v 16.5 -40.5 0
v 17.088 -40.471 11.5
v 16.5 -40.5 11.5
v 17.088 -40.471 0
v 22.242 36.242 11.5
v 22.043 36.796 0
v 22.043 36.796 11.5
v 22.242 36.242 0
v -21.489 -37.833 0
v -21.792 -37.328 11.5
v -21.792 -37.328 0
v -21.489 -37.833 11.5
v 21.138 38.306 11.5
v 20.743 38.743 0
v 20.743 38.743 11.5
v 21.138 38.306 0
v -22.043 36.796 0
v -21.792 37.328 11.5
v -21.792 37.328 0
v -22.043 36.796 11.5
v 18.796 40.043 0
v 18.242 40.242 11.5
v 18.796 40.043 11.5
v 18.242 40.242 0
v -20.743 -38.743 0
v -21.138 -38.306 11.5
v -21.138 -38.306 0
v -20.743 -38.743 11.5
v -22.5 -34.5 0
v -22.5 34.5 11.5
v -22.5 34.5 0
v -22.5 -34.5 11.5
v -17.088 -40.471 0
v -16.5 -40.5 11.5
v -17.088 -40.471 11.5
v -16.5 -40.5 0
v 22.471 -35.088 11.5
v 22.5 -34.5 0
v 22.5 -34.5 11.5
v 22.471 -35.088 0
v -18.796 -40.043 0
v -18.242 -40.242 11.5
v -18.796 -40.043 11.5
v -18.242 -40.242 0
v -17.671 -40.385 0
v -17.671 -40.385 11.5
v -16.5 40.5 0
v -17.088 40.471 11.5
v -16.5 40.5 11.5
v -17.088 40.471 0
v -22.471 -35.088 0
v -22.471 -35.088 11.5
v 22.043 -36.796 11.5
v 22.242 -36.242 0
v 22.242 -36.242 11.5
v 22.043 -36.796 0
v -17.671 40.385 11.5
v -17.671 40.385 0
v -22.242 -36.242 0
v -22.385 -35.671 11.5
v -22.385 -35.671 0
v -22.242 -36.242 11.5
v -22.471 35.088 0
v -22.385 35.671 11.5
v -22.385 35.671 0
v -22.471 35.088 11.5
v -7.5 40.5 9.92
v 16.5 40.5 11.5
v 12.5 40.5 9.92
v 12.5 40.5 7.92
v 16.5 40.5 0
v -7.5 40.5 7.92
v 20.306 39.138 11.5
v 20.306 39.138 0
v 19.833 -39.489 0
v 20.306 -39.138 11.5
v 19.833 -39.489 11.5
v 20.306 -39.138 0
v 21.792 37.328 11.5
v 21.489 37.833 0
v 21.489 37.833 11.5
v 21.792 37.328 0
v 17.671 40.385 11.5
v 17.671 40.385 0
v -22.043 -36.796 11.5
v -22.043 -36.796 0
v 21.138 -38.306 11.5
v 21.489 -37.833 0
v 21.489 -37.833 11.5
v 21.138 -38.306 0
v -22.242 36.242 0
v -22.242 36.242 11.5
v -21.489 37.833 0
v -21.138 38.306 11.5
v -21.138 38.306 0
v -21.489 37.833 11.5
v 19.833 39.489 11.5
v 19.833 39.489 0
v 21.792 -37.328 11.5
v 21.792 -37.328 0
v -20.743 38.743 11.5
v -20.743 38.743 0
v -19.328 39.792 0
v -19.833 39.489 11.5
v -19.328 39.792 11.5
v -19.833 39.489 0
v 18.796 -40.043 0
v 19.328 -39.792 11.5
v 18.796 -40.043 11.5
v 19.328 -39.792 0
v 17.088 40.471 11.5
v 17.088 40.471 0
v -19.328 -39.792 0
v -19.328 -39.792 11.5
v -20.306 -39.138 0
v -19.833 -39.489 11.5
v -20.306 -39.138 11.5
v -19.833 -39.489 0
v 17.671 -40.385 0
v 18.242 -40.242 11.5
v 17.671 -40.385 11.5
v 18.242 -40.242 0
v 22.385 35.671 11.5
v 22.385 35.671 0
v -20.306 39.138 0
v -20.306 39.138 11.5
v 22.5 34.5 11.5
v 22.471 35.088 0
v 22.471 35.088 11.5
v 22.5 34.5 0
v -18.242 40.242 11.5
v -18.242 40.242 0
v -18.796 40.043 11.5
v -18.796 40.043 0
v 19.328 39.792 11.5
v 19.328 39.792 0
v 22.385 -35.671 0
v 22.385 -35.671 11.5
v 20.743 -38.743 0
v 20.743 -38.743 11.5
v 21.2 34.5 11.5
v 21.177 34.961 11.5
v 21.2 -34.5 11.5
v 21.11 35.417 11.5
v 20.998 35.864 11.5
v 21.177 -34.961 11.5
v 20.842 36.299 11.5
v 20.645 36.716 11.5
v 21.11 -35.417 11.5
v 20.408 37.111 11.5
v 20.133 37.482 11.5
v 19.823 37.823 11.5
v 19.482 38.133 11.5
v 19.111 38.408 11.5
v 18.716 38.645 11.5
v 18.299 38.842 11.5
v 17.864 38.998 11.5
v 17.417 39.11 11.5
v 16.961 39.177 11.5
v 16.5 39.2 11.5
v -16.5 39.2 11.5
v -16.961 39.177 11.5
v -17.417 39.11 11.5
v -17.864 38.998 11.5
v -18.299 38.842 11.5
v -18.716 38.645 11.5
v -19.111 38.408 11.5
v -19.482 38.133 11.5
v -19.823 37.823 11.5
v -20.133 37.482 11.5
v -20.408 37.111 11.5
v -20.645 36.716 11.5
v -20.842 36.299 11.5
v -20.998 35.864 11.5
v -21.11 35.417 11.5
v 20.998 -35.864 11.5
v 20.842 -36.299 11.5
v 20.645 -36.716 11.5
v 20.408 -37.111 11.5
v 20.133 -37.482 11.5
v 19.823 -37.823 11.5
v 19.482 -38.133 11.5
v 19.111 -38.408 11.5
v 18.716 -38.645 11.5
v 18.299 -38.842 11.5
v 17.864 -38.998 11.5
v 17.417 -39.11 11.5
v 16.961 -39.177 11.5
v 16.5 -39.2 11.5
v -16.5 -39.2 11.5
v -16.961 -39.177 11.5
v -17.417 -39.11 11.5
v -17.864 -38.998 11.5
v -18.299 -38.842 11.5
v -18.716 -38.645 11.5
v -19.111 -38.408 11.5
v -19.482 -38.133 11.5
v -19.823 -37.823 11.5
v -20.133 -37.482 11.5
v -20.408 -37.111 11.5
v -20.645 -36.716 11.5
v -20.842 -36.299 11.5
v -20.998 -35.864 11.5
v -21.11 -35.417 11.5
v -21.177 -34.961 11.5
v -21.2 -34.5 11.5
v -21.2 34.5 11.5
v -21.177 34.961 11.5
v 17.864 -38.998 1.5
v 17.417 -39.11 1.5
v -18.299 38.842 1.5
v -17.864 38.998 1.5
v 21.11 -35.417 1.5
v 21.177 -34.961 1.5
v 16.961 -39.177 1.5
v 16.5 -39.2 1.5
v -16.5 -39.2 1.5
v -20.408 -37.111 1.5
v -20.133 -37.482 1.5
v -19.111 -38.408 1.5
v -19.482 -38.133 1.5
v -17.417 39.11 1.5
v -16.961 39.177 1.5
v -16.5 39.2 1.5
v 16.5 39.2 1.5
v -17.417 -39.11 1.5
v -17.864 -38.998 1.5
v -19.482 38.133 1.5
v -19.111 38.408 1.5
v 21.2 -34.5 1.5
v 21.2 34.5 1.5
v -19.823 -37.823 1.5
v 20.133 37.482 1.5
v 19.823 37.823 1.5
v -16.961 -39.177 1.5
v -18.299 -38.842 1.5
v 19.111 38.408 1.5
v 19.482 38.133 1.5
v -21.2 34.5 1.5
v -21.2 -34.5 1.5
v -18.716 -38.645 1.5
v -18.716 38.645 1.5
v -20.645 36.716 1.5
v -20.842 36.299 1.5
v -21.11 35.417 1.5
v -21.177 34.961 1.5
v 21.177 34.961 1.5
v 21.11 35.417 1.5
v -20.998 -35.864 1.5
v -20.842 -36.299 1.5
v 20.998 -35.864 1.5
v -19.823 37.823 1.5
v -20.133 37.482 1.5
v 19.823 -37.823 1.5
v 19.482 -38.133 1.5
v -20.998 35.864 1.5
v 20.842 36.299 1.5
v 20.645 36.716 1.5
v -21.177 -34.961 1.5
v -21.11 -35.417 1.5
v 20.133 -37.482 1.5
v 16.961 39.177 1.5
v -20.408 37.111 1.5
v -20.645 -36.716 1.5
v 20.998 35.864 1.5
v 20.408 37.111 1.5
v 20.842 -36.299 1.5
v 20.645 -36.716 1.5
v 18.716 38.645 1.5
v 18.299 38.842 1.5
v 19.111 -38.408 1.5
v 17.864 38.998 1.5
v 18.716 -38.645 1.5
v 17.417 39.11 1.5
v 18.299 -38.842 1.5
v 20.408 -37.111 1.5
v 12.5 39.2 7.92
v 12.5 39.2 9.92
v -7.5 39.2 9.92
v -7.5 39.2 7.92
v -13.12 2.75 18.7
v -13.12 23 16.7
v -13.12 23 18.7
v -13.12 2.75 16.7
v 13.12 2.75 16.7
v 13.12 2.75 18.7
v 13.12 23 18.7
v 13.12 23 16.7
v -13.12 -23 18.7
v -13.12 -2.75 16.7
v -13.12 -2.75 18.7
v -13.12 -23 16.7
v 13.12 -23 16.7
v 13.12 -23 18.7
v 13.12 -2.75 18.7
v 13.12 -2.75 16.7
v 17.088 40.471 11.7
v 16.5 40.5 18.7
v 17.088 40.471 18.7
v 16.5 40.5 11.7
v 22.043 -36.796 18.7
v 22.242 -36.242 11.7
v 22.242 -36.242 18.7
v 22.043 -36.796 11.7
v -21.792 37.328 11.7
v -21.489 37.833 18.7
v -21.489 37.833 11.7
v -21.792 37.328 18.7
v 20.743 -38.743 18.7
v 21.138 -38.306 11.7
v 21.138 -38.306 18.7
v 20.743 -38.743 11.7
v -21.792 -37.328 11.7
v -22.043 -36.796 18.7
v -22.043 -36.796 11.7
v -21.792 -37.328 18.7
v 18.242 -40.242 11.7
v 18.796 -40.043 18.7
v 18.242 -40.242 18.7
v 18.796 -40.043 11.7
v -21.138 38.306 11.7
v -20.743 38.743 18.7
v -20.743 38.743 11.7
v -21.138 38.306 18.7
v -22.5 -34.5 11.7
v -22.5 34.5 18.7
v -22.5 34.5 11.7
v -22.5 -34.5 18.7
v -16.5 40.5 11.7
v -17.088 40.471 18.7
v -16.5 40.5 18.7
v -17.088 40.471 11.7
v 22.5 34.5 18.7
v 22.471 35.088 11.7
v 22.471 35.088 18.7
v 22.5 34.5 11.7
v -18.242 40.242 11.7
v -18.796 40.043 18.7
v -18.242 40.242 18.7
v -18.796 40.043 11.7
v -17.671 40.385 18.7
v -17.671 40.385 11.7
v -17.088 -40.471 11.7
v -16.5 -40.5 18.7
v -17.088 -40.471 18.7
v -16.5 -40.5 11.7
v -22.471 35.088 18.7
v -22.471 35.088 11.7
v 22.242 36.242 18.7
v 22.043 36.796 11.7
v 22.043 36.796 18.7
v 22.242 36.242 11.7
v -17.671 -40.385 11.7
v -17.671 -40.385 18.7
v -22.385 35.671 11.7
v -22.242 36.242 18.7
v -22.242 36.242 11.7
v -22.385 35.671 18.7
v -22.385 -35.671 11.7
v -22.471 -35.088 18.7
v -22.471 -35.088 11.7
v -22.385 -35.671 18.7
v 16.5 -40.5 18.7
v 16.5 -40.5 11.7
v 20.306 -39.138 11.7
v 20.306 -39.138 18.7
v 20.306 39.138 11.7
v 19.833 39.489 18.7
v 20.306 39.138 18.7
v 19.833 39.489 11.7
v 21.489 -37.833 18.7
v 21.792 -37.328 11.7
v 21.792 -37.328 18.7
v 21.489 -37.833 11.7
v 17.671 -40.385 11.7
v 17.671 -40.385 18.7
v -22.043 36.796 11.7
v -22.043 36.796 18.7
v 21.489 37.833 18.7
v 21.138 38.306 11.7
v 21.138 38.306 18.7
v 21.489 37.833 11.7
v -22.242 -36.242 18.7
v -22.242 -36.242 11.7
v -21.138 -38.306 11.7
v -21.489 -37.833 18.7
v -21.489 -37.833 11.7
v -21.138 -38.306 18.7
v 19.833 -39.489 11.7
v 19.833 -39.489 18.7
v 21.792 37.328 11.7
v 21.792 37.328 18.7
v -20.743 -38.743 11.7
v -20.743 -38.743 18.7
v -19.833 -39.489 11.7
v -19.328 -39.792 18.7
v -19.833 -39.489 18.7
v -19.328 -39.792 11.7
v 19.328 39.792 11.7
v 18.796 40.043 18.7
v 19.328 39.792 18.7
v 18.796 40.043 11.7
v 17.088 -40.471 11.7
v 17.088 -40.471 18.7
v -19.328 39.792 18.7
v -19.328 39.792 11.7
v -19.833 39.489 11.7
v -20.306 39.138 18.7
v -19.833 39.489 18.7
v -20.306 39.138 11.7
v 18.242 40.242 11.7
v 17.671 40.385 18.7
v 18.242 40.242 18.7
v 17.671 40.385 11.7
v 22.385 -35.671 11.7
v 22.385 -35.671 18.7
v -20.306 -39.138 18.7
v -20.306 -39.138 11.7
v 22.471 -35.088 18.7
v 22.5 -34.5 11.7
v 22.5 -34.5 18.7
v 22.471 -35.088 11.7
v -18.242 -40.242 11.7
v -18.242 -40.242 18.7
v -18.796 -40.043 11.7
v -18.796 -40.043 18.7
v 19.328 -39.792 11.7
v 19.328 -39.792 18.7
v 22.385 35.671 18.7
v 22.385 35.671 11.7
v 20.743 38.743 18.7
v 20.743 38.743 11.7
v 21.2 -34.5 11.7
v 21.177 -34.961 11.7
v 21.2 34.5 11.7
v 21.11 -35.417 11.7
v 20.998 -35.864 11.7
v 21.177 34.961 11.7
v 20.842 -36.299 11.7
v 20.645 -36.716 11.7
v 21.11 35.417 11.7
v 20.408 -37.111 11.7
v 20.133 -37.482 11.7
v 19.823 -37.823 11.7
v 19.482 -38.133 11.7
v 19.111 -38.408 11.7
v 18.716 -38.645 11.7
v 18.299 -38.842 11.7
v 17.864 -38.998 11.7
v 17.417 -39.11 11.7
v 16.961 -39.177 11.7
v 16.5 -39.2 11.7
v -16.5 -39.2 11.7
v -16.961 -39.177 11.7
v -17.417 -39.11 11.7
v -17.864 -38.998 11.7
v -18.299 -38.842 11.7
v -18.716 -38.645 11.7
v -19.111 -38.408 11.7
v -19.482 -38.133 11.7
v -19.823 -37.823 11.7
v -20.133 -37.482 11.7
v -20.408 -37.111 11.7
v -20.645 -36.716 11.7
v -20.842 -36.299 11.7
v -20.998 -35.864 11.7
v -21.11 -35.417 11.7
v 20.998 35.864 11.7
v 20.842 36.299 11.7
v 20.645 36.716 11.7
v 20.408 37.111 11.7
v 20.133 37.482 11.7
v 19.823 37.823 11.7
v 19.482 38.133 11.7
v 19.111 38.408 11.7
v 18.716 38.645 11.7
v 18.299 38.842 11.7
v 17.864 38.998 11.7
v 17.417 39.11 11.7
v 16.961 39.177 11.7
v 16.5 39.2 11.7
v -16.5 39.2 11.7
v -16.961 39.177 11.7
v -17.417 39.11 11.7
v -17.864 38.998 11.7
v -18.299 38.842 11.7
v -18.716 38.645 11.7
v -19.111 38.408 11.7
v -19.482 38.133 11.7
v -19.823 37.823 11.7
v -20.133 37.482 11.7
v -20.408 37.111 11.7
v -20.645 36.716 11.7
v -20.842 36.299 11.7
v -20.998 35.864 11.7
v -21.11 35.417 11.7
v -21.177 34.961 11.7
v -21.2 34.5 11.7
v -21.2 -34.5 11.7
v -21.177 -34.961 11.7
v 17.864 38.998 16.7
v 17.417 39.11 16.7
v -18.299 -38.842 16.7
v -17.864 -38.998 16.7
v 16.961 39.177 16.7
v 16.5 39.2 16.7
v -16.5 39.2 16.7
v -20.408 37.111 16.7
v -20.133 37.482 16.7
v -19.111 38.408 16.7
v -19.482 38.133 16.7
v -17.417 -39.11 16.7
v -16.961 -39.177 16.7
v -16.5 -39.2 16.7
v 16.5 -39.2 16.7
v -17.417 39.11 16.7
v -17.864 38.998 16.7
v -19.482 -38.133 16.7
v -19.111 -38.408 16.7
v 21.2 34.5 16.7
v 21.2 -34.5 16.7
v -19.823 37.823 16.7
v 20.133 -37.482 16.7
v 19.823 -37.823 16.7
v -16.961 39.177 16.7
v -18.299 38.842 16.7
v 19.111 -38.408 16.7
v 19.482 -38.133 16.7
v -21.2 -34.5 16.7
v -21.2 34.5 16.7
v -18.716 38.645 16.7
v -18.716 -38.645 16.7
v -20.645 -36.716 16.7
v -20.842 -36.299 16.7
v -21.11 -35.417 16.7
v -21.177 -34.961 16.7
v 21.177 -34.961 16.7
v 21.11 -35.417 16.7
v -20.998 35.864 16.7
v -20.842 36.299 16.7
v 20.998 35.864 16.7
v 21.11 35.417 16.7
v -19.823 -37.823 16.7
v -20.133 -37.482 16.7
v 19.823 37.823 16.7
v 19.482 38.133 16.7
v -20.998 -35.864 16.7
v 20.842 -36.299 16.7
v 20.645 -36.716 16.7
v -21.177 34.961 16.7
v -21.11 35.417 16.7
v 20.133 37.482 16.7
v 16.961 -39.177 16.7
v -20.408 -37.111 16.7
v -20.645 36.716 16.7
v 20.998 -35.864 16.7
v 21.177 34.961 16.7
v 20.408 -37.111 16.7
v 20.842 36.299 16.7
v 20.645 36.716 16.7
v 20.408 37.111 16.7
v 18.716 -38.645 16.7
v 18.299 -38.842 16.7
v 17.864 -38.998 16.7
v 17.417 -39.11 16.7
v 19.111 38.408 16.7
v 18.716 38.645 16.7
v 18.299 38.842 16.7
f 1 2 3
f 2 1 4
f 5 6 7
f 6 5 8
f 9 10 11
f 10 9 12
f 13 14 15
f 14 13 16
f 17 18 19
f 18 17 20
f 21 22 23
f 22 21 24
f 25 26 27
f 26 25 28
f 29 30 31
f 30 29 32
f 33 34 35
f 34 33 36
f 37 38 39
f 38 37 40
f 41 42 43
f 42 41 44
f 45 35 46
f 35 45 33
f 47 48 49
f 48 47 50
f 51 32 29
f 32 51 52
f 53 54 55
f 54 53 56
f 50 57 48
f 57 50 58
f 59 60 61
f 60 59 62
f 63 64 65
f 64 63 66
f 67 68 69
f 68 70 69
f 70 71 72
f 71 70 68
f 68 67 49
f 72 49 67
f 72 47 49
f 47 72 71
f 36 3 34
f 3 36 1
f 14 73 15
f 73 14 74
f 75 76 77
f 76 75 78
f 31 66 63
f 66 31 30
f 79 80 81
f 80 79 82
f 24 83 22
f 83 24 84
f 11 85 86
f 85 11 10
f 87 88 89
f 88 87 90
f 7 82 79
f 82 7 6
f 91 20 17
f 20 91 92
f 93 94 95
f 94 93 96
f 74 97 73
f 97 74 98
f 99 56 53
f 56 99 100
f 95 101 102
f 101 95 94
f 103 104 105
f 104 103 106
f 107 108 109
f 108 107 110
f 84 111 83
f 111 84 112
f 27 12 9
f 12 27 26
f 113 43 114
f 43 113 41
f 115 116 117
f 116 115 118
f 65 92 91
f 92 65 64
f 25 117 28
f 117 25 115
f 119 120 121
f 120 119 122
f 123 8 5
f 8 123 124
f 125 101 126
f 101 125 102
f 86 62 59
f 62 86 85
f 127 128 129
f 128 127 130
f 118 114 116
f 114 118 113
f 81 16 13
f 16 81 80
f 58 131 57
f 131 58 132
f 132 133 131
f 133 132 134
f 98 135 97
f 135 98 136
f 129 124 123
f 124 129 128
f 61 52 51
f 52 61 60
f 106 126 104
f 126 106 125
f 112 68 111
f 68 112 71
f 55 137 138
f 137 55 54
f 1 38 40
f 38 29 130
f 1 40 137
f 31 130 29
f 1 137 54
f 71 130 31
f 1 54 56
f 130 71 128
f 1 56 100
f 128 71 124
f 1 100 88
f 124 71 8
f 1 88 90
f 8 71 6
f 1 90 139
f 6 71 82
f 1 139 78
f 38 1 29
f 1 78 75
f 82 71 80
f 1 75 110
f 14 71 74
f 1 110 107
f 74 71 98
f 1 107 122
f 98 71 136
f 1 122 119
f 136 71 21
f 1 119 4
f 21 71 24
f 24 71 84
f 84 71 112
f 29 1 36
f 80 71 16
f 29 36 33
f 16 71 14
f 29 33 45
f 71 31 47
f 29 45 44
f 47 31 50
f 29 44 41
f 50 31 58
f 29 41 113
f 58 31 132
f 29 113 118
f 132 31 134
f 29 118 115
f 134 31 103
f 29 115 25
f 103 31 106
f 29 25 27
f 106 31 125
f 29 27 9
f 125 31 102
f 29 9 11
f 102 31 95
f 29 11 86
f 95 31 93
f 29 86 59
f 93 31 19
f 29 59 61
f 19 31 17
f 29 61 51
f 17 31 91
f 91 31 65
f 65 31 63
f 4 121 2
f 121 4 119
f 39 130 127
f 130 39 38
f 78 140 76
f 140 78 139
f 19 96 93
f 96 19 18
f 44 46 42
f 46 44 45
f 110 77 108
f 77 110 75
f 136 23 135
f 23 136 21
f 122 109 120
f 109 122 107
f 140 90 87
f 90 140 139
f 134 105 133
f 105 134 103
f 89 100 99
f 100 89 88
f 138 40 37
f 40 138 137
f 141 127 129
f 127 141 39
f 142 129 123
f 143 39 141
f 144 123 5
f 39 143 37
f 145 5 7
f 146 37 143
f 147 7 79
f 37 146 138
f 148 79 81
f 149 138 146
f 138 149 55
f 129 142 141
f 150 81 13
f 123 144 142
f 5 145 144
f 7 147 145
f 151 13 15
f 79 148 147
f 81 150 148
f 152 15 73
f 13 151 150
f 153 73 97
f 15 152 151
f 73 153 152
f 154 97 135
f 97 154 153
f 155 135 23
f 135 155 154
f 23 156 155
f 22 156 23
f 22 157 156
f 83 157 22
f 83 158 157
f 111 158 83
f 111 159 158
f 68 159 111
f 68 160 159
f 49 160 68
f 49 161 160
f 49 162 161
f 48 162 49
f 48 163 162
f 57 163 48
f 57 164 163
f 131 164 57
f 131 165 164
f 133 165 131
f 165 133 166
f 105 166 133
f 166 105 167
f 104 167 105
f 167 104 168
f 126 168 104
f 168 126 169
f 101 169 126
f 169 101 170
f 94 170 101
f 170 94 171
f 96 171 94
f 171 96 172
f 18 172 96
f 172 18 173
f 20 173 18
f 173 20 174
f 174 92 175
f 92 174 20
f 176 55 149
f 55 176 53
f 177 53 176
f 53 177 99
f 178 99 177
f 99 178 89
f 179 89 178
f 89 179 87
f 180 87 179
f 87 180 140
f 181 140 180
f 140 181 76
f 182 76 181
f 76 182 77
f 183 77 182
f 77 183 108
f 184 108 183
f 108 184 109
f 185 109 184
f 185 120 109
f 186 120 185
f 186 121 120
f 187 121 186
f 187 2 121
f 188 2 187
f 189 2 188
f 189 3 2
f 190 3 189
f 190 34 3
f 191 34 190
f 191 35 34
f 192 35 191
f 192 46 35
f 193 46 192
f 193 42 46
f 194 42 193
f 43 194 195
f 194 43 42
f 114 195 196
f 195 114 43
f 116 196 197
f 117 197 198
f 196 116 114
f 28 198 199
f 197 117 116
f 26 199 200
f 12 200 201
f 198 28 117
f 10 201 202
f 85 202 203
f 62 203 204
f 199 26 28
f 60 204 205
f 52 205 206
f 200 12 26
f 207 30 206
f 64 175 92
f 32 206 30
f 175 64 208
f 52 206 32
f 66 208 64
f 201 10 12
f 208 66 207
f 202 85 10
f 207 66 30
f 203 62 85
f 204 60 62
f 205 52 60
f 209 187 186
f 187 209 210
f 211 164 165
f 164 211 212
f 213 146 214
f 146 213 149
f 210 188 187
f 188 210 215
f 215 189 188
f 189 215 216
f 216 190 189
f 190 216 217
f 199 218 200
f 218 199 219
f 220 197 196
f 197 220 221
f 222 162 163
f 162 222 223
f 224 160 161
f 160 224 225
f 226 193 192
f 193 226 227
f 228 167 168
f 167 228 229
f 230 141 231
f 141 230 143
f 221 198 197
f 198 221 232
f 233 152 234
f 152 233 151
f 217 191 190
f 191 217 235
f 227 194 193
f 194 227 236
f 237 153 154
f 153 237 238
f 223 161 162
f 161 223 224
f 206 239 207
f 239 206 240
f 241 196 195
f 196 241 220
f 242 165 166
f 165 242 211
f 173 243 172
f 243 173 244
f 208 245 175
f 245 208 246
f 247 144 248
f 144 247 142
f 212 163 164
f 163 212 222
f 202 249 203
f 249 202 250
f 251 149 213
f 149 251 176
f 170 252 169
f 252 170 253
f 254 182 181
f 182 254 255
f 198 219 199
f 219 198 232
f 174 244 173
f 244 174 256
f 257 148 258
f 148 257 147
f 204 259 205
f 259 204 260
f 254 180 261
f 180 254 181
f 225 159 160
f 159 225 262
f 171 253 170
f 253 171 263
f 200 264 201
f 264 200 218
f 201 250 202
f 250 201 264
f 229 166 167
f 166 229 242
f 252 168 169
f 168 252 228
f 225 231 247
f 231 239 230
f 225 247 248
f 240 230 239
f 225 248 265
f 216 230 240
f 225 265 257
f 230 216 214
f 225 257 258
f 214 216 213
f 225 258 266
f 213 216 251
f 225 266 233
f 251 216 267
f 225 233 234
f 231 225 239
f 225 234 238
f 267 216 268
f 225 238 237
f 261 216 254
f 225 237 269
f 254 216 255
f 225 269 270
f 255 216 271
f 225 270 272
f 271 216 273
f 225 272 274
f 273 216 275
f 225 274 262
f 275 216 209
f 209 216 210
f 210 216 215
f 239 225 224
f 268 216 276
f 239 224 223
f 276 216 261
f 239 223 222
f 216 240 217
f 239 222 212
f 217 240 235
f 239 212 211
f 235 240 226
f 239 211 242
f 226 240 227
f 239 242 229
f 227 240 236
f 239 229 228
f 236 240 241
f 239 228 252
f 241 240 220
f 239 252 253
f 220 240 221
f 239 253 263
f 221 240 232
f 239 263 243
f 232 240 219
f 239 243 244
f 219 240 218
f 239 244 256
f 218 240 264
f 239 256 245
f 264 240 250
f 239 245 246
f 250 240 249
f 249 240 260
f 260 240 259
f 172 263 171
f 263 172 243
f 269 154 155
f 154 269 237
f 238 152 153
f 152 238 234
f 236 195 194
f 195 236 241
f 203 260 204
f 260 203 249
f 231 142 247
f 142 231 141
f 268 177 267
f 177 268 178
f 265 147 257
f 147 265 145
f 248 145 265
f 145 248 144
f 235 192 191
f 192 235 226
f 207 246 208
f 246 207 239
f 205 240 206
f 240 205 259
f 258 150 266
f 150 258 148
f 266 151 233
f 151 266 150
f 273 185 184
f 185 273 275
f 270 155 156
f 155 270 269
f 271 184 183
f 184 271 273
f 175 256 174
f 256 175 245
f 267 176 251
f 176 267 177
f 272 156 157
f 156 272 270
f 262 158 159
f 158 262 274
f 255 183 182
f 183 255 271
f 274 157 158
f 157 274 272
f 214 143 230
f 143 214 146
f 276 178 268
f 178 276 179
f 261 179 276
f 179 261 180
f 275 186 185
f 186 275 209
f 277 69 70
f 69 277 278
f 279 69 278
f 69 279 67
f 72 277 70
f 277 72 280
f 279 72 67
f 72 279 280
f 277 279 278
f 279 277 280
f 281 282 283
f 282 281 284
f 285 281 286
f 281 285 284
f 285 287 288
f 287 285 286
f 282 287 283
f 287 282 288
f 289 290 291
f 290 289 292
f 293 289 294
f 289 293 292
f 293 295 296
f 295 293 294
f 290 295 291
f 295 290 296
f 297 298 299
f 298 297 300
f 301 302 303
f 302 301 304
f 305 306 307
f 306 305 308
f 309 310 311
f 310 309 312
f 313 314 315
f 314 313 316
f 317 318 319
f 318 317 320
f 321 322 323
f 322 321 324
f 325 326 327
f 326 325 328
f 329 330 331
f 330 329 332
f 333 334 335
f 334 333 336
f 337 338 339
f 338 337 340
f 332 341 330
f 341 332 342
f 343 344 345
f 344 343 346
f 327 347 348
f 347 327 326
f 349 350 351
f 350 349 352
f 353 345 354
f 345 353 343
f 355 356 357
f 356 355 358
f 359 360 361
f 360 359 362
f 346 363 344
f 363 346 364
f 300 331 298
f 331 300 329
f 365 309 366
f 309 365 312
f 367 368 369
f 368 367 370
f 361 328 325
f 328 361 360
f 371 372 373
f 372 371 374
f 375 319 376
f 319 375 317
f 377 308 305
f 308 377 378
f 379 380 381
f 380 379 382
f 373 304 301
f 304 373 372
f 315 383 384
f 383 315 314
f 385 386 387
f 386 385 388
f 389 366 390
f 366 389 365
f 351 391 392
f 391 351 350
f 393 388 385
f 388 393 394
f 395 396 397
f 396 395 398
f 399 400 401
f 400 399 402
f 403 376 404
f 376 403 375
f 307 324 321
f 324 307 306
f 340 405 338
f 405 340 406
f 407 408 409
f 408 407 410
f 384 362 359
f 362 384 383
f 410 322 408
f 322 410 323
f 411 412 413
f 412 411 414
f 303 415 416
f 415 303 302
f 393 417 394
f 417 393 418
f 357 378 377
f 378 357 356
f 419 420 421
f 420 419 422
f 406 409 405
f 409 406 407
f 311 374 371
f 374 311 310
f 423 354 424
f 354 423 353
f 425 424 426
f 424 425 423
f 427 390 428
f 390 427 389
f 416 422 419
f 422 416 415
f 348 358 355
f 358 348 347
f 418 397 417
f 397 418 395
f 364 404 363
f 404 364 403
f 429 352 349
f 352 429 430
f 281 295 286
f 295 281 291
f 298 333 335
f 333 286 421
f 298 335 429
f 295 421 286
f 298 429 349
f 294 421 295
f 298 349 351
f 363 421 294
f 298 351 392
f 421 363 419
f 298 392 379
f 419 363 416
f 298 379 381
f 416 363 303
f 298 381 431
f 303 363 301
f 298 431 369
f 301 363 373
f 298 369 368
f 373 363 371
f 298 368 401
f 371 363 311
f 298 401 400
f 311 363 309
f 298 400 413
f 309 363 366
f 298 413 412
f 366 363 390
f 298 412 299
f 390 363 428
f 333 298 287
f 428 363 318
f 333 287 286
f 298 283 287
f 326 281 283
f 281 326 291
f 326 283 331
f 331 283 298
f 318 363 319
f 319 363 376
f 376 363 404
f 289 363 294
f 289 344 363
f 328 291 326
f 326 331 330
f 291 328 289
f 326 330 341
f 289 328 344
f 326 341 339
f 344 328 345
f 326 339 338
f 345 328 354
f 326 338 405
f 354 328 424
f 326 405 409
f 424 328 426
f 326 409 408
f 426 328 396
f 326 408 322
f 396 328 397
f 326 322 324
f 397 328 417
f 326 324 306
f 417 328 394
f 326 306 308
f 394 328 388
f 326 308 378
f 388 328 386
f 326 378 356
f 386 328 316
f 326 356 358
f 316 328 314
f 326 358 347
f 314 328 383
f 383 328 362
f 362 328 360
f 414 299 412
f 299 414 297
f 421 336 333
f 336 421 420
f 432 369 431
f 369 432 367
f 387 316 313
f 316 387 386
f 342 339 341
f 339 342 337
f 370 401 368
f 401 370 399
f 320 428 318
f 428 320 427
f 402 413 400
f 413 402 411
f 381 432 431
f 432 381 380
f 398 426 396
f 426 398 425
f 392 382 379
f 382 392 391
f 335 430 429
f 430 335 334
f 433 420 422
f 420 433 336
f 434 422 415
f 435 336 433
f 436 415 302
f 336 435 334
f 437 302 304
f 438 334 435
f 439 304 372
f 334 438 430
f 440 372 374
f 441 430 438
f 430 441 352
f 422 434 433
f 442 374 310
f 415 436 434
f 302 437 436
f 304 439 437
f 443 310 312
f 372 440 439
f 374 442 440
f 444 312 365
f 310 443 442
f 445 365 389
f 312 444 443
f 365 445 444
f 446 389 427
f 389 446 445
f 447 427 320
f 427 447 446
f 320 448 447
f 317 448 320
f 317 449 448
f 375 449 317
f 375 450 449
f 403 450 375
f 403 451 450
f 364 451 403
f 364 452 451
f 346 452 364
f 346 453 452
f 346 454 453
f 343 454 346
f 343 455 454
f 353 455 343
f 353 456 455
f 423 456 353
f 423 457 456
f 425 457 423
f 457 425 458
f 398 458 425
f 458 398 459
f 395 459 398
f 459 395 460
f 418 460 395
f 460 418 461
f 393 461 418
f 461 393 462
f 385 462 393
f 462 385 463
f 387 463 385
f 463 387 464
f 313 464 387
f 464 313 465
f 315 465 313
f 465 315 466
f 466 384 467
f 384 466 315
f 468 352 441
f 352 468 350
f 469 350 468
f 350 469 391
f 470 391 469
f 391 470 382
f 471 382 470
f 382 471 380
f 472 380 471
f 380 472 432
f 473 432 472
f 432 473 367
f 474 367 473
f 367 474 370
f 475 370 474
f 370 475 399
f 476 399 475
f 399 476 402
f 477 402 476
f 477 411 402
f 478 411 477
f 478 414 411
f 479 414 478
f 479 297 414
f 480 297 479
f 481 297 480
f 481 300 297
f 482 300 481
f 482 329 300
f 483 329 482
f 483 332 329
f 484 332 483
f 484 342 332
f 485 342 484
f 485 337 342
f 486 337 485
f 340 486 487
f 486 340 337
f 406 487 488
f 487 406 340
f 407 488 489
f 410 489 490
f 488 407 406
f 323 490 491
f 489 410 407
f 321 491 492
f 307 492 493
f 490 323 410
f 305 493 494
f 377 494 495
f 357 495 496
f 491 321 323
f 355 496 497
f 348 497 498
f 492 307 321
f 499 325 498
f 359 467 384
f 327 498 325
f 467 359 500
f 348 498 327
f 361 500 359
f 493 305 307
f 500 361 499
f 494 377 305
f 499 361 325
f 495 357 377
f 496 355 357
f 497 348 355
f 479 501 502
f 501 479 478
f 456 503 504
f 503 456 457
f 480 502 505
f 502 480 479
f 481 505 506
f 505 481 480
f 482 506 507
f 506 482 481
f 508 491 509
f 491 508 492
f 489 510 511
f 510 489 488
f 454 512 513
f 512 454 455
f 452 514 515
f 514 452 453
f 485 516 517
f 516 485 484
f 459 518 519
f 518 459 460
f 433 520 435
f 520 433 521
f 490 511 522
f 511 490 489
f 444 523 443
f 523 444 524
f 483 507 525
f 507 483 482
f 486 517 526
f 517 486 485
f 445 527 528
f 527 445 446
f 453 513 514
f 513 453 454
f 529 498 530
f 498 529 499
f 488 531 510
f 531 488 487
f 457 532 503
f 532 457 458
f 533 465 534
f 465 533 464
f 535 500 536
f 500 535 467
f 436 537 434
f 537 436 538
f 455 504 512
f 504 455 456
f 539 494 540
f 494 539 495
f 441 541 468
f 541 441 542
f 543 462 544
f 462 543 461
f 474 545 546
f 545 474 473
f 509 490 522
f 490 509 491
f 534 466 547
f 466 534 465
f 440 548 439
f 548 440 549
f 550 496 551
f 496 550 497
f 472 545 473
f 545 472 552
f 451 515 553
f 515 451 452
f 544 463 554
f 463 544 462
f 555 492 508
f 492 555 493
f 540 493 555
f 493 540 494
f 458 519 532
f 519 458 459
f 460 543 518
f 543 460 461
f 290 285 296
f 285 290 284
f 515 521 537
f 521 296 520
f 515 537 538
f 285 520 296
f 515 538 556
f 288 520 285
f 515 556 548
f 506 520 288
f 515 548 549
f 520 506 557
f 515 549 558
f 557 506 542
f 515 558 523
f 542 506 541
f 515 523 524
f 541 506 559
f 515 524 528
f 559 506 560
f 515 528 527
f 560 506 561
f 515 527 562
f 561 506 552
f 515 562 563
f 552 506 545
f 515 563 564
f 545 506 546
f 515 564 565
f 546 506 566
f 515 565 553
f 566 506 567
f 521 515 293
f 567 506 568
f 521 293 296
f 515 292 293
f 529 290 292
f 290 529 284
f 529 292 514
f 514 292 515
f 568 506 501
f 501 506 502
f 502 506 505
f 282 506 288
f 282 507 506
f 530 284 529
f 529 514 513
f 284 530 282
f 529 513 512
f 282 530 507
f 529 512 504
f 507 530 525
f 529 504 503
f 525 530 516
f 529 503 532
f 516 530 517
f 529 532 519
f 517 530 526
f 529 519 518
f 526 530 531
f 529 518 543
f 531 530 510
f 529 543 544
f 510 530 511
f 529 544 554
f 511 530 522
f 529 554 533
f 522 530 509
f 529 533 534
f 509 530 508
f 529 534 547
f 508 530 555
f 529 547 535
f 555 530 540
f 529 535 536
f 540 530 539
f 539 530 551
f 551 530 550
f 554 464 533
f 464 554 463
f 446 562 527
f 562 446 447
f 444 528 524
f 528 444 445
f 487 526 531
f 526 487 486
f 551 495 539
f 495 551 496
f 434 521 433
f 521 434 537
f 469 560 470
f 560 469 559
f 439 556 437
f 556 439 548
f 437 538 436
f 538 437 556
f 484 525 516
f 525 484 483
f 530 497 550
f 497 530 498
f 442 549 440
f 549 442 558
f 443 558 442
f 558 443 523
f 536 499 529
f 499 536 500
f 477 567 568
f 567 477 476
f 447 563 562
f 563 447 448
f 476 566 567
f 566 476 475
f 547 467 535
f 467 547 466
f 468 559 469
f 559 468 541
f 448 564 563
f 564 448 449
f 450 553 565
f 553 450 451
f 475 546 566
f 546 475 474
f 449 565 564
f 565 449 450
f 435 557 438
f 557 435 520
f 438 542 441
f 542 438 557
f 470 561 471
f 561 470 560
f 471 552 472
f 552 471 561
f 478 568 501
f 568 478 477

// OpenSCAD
// BYD秦（2014款）遥控钥匙保护套
// 从 STL 反求参数，rect_tube 容器 + 开窗

render_mode = "together"; // ["together","top","bottom","assembled"]

// 圆角半径：从STL反求 (45-32.37)/2
corner_r = 6.00;

wall_th = 1.3;
$fn = 64;

/* [上盖 - 矮壳7mm，底板双窗] */
top_w   = 45.0;
top_h   = 81.0;
top_z   = 7.0;
top_bot = 2.0;

// 窗口距左右9.38mm，距前后17.50mm，横条5.5mm
hole_xm = 9.38;
hole_ym = 17.50;
hole_b  = 5.5;

/* [下盖 - 高壳11.5mm] */
bot_w   = 45.0;
bot_h   = 81.0;
bot_z   = 11.5;
bot_bot = 1.5;

asm_gap = 0.2;

// ====================

module rounded_rect(w,h,r) {
    offset(r=r) square([w-2*r, h-2*r], center=true);
}

// rect_tube 容器
module rect_tube(w,h,total_z,bot,th,r,has_hole=false) {
    ir = max(r-th, 0.5);
    difference() {
        linear_extrude(total_z) rounded_rect(w,h,r);
        translate([0,0,bot])
            linear_extrude(total_z-bot+0.05)
                rounded_rect(w-2*th, h-2*th, ir);

        if (has_hole) {
            y0 = 134.5-157.5;
            y1 = 180.5-157.5;
            ww = w - 2*hole_xm;
            sub = ((y1-y0) - hole_b)/2;
            translate([0, y0+sub/2, -0.1])
                linear_extrude(bot+0.2)
                    square([ww,sub], center=true);
            translate([0, y1-sub/2, -0.1])
                linear_extrude(bot+0.2)
                    square([ww,sub], center=true);
        }
    }
}

module top_cover() {
    rect_tube(top_w,top_h,top_z,top_bot,wall_th,corner_r,has_hole=true);
}

module bottom_cover() {
    h = bot_h;
    w = bot_w;

    difference() {
        rect_tube(w,h,bot_z,bot_bot,wall_th,corner_r);

        // 侧窗：后侧墙(Y+壁, X-Z平面)，长条形
        // 右上角: 距右侧(X+)边缘10mm, 距顶1.58mm
        // 向X-延伸20mm, 向Z-延伸2mm, 贯穿Y壁厚
        translate([w/2-10-20, h/2-wall_th, bot_z-1.58-2])
            cube([20, wall_th, 2]);
    }
}

// ====================

if (render_mode=="together") {
    color("DodgerBlue",0.85) bottom_cover();
    translate([0,0,bot_z+asm_gap+top_z]) rotate([180,0,0])
        color("DodgerBlue",0.85) top_cover();
} else if (render_mode=="top") {
    color("DodgerBlue",0.85) top_cover();
} else if (render_mode=="bottom") {
    color("DodgerBlue",0.85) bottom_cover();
} else {
    translate([0,0,bot_z]) rotate([180,0,0])
        color("DodgerBlue",0.85) top_cover();
    color("LightBlue",0.7) bottom_cover();
}
